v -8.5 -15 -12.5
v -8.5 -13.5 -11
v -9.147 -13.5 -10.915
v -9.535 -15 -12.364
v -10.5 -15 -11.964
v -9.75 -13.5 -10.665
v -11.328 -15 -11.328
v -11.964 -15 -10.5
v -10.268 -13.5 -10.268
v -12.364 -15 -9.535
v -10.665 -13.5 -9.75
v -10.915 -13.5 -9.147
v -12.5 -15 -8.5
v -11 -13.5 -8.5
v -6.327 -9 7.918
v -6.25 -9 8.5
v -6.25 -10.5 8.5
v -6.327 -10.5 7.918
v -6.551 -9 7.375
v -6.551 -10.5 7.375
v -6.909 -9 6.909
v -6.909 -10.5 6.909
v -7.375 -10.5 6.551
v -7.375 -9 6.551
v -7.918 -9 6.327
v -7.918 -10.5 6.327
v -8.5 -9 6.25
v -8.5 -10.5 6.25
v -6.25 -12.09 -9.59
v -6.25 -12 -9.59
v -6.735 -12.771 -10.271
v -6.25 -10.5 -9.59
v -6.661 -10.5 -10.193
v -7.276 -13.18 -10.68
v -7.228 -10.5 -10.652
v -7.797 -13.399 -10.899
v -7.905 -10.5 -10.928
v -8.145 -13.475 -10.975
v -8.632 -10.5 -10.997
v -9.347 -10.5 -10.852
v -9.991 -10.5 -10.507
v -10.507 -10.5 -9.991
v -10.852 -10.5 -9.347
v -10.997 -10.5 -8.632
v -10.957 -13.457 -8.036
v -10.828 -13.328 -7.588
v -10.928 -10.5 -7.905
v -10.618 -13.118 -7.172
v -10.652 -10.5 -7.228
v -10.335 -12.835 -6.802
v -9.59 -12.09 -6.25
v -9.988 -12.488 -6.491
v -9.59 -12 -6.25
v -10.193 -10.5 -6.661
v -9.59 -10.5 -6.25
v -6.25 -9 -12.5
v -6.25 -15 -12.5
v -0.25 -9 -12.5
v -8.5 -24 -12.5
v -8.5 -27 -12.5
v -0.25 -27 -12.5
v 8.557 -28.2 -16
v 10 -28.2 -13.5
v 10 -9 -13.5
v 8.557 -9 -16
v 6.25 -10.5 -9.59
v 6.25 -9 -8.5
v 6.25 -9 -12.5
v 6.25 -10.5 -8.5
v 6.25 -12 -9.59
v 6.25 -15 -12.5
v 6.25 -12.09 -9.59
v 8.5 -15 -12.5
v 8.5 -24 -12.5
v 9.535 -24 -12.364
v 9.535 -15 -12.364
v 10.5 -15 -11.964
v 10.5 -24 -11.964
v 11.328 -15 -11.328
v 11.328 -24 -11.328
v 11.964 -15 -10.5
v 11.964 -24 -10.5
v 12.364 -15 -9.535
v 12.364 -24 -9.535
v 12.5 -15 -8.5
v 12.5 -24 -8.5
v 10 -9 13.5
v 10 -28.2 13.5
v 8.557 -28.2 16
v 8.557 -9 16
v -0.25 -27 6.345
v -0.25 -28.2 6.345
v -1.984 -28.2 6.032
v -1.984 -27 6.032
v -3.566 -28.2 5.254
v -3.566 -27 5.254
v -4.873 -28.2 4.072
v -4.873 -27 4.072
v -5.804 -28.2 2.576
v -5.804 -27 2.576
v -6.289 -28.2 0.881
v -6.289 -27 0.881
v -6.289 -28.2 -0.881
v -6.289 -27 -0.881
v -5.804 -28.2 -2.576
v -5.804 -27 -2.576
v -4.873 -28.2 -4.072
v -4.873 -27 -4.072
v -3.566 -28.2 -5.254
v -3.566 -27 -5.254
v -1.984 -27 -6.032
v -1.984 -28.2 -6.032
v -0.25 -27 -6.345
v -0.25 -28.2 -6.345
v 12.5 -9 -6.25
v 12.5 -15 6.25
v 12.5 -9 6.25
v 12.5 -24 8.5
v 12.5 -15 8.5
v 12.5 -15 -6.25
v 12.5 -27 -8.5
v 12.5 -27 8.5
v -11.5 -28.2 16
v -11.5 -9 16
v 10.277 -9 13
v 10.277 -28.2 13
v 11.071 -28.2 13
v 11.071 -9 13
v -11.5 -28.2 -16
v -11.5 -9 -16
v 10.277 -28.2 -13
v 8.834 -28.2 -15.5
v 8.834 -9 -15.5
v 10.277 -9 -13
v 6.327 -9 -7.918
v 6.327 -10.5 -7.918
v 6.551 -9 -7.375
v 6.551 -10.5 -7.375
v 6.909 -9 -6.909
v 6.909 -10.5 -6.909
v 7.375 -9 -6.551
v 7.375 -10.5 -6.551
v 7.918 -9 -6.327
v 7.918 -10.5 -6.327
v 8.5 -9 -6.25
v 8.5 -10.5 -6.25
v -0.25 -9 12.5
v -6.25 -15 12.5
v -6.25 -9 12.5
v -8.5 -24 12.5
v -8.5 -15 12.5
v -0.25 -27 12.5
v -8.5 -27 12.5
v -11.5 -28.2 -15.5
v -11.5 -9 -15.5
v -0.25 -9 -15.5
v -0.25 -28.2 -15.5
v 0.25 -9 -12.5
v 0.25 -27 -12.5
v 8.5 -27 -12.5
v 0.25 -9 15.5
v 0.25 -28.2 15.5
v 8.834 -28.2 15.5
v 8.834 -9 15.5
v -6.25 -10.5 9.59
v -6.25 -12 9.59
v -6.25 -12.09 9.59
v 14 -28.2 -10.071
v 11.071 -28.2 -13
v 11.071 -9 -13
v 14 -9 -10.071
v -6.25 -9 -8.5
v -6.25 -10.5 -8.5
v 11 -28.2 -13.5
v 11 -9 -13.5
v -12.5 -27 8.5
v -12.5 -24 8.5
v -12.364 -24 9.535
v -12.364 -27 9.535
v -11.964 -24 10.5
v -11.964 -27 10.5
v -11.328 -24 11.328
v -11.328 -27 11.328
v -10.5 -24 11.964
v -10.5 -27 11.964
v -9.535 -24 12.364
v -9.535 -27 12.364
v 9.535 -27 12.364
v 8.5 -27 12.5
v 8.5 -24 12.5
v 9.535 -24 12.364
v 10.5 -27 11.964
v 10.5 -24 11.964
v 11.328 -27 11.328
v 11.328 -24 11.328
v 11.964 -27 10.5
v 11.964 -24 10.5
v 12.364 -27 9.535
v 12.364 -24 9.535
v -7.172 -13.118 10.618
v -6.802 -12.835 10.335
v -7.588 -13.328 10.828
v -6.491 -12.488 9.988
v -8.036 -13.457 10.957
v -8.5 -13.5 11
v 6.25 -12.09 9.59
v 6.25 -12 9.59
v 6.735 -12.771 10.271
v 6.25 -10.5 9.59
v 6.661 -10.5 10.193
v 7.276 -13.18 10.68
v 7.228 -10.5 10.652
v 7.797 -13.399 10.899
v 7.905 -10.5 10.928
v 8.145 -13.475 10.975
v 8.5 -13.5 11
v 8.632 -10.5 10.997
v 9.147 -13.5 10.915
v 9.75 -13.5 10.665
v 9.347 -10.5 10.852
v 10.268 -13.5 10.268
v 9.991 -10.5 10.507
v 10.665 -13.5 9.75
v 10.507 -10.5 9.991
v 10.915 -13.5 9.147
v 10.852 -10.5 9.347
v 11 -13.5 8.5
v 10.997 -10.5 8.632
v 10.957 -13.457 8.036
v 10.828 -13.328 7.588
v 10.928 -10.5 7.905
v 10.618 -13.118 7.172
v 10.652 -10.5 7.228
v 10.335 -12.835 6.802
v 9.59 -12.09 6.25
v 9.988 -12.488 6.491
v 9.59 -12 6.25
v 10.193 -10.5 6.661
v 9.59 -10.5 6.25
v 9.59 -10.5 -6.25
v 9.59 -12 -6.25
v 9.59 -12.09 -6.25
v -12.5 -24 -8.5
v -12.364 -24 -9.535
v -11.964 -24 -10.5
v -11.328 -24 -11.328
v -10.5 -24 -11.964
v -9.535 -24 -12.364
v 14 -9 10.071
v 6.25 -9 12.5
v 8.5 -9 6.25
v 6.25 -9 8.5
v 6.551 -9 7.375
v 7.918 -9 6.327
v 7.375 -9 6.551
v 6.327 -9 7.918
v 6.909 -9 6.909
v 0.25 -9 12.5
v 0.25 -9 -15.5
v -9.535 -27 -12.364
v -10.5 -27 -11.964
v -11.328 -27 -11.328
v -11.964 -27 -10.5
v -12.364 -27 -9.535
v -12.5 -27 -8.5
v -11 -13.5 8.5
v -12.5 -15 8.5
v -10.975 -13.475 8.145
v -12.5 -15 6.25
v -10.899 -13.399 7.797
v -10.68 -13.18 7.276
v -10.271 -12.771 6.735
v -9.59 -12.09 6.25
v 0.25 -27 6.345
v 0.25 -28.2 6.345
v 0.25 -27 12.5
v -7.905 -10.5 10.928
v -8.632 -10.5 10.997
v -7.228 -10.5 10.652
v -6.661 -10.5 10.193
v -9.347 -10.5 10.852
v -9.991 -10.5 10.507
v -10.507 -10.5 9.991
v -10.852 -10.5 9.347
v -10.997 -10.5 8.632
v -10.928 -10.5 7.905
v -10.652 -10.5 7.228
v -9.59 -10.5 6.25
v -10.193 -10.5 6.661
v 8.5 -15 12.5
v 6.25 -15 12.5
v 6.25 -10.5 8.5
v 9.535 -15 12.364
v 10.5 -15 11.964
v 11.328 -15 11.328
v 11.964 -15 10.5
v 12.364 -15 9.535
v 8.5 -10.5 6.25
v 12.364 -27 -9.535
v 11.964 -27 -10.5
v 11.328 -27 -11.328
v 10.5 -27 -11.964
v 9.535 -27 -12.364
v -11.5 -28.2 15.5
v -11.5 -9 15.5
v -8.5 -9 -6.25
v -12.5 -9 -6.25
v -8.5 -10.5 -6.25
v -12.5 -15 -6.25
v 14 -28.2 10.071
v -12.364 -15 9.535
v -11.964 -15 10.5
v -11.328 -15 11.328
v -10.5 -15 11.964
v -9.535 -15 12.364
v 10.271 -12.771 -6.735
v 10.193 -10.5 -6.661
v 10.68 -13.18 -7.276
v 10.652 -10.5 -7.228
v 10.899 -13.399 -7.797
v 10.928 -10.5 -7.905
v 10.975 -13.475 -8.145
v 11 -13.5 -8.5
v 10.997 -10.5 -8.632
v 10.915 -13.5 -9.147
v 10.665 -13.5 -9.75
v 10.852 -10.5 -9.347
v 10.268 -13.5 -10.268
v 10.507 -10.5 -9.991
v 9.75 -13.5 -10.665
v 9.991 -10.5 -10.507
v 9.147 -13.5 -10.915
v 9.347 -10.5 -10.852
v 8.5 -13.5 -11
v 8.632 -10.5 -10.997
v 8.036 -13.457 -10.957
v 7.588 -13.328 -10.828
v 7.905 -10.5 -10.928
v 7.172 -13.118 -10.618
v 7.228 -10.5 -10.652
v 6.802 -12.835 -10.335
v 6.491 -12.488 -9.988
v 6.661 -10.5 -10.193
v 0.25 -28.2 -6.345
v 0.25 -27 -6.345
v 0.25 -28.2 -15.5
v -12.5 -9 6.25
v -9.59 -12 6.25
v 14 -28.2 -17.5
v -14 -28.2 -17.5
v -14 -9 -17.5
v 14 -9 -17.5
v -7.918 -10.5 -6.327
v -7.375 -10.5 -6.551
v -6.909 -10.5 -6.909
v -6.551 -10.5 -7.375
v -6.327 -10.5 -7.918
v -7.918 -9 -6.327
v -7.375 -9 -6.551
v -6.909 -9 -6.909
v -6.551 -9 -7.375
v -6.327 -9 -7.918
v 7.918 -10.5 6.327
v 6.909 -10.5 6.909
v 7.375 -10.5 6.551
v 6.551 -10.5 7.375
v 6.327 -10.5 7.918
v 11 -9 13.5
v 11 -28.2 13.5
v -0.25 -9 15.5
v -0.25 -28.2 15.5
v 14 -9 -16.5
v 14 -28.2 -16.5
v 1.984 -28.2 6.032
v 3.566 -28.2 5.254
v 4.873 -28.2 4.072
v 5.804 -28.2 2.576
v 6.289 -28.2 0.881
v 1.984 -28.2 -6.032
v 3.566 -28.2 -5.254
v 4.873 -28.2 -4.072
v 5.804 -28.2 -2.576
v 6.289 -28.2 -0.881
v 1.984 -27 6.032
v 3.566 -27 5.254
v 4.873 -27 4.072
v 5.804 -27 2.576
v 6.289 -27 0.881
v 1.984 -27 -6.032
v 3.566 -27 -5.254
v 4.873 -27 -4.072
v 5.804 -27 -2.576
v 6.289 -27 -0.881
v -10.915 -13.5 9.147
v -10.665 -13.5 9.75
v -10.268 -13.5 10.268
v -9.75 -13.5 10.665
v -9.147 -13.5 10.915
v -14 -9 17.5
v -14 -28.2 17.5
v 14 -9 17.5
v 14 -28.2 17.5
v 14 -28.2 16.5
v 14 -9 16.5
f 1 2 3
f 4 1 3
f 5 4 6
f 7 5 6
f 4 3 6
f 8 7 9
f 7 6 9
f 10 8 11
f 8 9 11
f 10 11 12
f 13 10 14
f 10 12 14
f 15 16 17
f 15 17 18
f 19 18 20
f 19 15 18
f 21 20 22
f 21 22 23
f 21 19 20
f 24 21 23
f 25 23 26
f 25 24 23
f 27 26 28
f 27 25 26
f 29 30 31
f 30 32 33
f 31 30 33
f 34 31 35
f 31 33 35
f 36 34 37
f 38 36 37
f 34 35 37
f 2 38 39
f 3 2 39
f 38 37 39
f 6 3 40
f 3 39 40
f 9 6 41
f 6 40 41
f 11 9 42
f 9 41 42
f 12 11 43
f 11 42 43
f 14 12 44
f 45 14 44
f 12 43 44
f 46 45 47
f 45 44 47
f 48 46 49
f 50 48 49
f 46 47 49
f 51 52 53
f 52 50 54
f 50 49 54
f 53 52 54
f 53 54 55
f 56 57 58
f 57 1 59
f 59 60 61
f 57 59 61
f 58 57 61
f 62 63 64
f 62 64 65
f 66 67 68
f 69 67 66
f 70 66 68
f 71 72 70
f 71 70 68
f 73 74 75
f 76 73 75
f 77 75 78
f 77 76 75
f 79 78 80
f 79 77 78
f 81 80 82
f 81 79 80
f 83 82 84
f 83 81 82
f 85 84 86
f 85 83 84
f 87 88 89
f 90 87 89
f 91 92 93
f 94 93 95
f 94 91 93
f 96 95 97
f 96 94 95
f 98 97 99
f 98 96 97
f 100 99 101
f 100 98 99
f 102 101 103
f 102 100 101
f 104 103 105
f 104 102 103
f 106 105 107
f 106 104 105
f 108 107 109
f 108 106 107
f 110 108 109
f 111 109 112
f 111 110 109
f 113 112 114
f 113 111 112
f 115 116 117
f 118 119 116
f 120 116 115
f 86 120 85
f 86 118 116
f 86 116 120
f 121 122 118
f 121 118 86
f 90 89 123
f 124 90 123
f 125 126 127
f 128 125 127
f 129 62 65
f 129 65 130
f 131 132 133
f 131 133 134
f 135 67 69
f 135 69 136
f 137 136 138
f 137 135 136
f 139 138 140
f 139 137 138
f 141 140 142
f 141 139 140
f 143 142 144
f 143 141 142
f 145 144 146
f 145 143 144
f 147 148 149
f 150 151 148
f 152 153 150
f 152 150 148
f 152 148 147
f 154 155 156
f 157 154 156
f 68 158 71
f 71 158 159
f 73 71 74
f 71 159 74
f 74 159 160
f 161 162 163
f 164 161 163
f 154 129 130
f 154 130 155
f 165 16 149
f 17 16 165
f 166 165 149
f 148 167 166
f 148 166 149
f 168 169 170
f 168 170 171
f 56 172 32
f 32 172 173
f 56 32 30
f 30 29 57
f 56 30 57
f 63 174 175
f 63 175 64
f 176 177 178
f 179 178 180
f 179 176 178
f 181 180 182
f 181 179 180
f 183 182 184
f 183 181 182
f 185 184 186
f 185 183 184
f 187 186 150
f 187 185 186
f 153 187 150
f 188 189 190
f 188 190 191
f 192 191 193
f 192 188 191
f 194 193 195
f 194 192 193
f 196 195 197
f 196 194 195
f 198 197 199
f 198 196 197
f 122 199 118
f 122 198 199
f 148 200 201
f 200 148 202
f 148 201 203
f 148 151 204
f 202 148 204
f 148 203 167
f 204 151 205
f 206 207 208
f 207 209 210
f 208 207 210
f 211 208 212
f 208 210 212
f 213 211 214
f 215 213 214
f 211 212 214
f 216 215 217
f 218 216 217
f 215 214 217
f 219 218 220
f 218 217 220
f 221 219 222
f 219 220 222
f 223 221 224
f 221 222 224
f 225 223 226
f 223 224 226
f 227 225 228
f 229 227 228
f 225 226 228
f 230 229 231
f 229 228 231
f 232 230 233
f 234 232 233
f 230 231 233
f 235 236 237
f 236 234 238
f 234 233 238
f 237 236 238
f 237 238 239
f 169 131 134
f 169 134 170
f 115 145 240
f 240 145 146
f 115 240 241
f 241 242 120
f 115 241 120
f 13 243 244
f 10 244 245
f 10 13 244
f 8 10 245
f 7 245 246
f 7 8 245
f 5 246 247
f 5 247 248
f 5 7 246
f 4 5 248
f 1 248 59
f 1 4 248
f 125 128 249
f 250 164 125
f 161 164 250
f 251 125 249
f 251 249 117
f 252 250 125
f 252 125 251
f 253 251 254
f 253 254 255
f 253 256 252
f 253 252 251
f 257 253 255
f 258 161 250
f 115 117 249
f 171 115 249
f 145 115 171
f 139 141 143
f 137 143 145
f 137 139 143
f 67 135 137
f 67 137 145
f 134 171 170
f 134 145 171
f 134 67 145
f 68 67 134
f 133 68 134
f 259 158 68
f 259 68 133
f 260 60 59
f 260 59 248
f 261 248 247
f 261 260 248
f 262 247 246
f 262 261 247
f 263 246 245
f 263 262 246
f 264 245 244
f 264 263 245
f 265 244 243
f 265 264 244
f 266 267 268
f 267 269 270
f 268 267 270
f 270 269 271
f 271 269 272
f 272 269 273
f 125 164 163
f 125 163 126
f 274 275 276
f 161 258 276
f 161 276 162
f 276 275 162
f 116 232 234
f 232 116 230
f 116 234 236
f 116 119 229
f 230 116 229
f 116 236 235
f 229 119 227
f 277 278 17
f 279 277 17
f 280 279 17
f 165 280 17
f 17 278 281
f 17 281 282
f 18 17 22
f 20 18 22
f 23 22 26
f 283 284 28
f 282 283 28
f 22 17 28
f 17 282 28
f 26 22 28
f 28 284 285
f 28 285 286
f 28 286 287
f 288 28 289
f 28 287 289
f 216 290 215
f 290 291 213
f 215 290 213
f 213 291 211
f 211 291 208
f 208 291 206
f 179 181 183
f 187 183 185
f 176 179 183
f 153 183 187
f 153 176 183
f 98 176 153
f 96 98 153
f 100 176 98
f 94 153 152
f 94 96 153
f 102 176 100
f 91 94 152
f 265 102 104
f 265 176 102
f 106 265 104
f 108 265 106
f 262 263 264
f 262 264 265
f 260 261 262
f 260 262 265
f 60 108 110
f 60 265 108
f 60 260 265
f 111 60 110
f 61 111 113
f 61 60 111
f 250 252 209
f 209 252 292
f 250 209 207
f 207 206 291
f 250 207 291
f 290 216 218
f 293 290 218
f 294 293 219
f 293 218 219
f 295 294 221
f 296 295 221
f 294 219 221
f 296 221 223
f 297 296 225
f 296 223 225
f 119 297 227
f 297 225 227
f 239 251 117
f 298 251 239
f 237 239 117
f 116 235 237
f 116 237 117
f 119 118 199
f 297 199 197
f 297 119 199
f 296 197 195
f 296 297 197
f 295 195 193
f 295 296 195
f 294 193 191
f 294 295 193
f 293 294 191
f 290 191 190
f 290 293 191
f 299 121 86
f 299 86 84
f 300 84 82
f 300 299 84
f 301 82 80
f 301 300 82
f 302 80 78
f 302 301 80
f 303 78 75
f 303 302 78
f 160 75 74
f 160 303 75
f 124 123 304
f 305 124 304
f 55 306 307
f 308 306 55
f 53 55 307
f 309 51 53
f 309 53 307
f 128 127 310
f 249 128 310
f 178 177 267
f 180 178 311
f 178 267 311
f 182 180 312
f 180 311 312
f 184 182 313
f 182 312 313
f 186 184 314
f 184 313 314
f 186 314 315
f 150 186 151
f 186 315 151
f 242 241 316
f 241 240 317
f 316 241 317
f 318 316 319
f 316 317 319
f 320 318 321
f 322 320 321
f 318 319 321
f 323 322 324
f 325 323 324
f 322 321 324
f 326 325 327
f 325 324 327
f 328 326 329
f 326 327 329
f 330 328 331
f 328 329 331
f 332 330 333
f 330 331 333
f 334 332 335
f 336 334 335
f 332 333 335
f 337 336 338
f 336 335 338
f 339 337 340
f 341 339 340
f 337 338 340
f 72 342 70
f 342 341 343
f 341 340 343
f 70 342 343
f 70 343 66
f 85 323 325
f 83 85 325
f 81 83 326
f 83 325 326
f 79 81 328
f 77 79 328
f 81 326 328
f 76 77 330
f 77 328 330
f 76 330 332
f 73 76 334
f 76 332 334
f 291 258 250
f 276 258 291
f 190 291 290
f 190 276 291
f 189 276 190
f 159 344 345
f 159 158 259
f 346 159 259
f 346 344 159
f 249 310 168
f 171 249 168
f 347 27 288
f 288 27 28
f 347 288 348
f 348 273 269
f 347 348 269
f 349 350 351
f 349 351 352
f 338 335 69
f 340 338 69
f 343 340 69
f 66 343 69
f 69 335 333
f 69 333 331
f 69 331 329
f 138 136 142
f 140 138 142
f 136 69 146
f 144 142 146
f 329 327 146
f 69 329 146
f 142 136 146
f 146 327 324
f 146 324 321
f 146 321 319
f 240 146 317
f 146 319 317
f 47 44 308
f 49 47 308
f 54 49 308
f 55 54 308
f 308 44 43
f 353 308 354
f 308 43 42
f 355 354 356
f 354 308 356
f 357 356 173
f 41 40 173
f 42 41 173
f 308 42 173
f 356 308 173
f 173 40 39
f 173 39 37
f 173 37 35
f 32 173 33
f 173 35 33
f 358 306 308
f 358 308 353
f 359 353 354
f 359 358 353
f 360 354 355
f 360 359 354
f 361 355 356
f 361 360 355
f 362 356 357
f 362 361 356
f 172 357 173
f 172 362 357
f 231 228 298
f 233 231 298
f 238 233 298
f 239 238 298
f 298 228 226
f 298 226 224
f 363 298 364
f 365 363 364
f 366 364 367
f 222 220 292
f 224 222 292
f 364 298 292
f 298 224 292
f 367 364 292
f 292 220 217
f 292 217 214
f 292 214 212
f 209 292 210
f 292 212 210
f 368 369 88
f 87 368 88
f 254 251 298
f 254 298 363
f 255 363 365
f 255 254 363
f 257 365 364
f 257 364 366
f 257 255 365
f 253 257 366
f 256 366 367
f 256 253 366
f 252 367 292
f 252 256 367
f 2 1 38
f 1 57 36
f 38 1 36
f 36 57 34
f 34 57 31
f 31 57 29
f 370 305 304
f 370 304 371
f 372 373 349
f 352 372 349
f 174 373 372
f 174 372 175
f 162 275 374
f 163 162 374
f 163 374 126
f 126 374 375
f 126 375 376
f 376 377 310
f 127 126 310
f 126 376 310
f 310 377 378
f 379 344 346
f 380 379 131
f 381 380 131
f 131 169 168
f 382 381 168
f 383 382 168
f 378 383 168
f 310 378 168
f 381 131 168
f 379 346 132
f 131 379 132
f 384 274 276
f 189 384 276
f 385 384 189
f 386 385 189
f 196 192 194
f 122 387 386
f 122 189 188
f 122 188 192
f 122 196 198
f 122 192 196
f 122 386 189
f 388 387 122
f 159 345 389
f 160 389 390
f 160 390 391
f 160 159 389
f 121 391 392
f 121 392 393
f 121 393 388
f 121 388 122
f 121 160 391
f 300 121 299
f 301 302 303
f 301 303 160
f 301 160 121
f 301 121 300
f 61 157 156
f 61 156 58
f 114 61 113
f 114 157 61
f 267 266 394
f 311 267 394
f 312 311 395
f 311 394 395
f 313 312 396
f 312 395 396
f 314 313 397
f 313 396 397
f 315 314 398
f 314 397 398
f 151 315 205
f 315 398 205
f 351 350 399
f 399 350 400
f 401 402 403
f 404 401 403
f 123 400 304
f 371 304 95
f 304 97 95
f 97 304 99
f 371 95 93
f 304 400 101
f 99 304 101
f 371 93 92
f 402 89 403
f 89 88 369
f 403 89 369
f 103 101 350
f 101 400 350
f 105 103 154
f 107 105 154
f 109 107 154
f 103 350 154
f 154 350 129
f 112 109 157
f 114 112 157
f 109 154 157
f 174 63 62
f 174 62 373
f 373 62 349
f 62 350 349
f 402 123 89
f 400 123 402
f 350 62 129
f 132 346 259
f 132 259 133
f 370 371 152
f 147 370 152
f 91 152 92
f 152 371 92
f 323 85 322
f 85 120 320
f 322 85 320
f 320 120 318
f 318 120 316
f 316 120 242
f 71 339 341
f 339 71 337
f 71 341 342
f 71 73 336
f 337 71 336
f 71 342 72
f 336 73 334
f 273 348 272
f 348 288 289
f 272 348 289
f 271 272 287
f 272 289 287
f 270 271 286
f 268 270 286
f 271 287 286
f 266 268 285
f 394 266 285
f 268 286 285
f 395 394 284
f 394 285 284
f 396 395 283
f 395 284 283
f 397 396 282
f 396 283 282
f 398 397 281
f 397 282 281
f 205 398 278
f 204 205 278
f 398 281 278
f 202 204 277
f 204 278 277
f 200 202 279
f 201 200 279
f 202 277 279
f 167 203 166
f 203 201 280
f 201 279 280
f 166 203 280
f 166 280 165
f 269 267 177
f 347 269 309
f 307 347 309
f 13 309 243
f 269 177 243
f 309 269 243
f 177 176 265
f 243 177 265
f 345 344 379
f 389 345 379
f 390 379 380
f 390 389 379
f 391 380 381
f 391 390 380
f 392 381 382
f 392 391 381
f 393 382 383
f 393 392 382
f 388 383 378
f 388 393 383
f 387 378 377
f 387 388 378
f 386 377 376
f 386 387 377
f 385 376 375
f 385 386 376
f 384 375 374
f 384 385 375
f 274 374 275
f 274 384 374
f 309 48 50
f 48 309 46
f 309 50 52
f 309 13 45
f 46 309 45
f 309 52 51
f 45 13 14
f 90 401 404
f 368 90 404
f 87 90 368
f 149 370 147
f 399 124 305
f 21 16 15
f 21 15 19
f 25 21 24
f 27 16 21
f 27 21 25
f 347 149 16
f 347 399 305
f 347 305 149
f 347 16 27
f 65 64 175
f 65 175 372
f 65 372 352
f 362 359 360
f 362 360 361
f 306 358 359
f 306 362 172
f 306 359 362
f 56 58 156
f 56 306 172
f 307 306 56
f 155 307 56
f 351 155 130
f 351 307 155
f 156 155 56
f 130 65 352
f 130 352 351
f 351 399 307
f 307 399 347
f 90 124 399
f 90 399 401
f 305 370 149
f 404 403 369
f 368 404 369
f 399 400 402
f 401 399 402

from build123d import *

# Parameters (mm, degrees)
SKETCH1_W           = 8.4
SKETCH1_H           = 3
SKETCH2_OUTSIDE_W   = 44.372
SKETCH2_OUTSIDE_H   = 44.372
SKETCH2_OUTSIDE_W_2 = 28
SKETCH2_OUTSIDE_H_2 = 35
CUT_EXTRUDE2_DEPTH  = 24.70949177
SKETCH2_3_W         = 28
SKETCH2_3_H         = 35
SKETCH2_3_W_2       = 25
SKETCH2_3_H_2       = 25
BOSS_EXTRUDE1_DEPTH = 15
BOSS_EXTRUDE2_START = -4.2
BOSS_EXTRUDE2_DEPTH = 4.2
FILLET1_R           = 4
BOSS_EXTRUDE4_DEPTH = 3
SKETCH3_5_R         = 2.25
SKETCH3_5_R_2       = 1.45
BOSS_EXTRUDE6_DEPTH = 1.5
SKETCH3_R           = 1.45
BOSS_EXTRUDE3_DEPTH = 1.5
CIRPATTERN7_COUNT   = 4
CHAMFER1_SIZE       = 3
CUT_EXTRUDE6_START  = -3
CUT_EXTRUDE6_DEPTH  = 3
CUT_EXTRUDE5_START  = -19.2
CUT_EXTRUDE5_DEPTH  = 19.2


# Read off the part's stored shape, not the designer's step: Cut-Extrude5
with BuildPart() as part:
    # Sketch1 → Revolve2 (revolve)
    with BuildSketch(Plane.XY, mode=Mode.PRIVATE) as revolve2_sk:
        with Locations((-12.3, -25.5)):
            Rectangle(SKETCH1_W, SKETCH1_H)
        Polygon((-6.35, -27), (-8.1, -27), (-16.5, -27), (-16.5, -28.2), (-8.1, -28.2), (-6.35, -28.2), align=None)
    revolve(revolve2_sk.sketch.rotate(Axis((0, 21.737527327, 0), (0, -1, 0)), 270), axis=Axis((0, 21.737527327, 0), (0, -1, 0)))

    # Sketch2 outside → Cut-Extrude2 (cut, through all)
    with BuildSketch(Plane(origin=(0, -24, 0), x_dir=(1, 0, 0), z_dir=(0, 1, 0))):
        Rectangle(SKETCH2_OUTSIDE_W, SKETCH2_OUTSIDE_H)
        Rectangle(SKETCH2_OUTSIDE_W_2, SKETCH2_OUTSIDE_H_2, mode=Mode.SUBTRACT)
    extrude(amount=-CUT_EXTRUDE2_DEPTH, mode=Mode.SUBTRACT)

    # Sketch2<3> → Boss-Extrude1 (add)
    with BuildSketch(Plane(origin=(0, -24, 0), x_dir=(1, 0, 0), z_dir=(0, 1, 0))):
        Rectangle(SKETCH2_3_W, SKETCH2_3_H)
        Rectangle(SKETCH2_3_W_2, SKETCH2_3_H_2, mode=Mode.SUBTRACT)
    extrude(amount=BOSS_EXTRUDE1_DEPTH)

    # Sketch2<4> → Boss-Extrude2 (add)
    with BuildSketch(Plane(origin=(0, -24, 0), x_dir=(1, 0, 0), z_dir=(0, 1, 0)).offset(BOSS_EXTRUDE2_START)):
        with BuildLine():
            Line((-12.5, -12.5), (-10.770329614, -12.5))
            ThreePointArc((-10.770329614, -12.5), (-11.66726189, -11.66726189), (-12.5, -10.770329614))
            Line((-12.5, -10.770329614), (-12.5, -12.5))
        make_face()
        with BuildLine():
            Line((12.5, -10.770329614), (12.5, -12.5))
            Line((12.5, -12.5), (10.770329614, -12.5))
            ThreePointArc((10.770329614, -12.5), (0, -16.5), (-10.770329614, -12.5))
            Line((-10.770329614, -12.5), (-12.5, -12.5))
            Line((-12.5, -12.5), (-12.5, -10.770329614))
            ThreePointArc((-12.5, -10.770329614), (-13.289133528, -9.7800271), (-14, -8.732124598))
            Line((-14, -8.732124598), (-14, -17.5))
            Line((-14, -17.5), (14, -17.5))
            Line((14, -17.5), (14, -8.732124598))
            ThreePointArc((14, -8.732124598), (13.289133528, -9.7800271), (12.5, -10.770329614))
        make_face()
        with BuildLine():
            Line((10.770329614, -12.5), (12.5, -12.5))
            Line((12.5, -12.5), (12.5, -10.770329614))
            ThreePointArc((12.5, -10.770329614), (11.66726189, -11.66726189), (10.770329614, -12.5))
        make_face()
        with BuildLine():
            Line((12.5, 12.5), (12.5, 10.770329614))
            ThreePointArc((12.5, 10.770329614), (13.289133528, 9.7800271), (14, 8.732124598))
            Line((14, 8.732124598), (14, 17.5))
            Line((14, 17.5), (-14, 17.5))
            Line((-14, 17.5), (-14, 8.732124598))
            ThreePointArc((-14, 8.732124598), (-13.289133528, 9.7800271), (-12.5, 10.770329614))
            Line((-12.5, 10.770329614), (-12.5, 12.5))
            Line((-12.5, 12.5), (-10.770329614, 12.5))
            ThreePointArc((-10.770329614, 12.5), (0, 16.5), (10.770329614, 12.5))
            Line((10.770329614, 12.5), (12.5, 12.5))
        make_face()
        with BuildLine():
            ThreePointArc((10.770329614, 12.5), (11.66726189, 11.66726189), (12.5, 10.770329614))
            Line((12.5, 10.770329614), (12.5, 12.5))
            Line((12.5, 12.5), (10.770329614, 12.5))
        make_face()
        with BuildLine():
            Line((-12.5, 12.5), (-12.5, 10.770329614))
            ThreePointArc((-12.5, 10.770329614), (-11.66726189, 11.66726189), (-10.770329614, 12.5))
            Line((-10.770329614, 12.5), (-12.5, 12.5))
        make_face()
    extrude(amount=BOSS_EXTRUDE2_DEPTH)

    # Fillet1
    fillet1_edges = [part.edges().sort_by_distance(p)[0] for p in [
        (-12.5, -16.5, 12.5),
        (12.5, -16.5, 12.5),
        (12.5, -16.5, -12.5),
        (-12.5, -16.5, -12.5),
    ]]
    fillet(fillet1_edges, radius=FILLET1_R)

    # Sketch3<3> → Boss-Extrude4 (add)
    with BuildSketch(Plane(origin=(0, -9, 0), x_dir=(1, 0, 0), z_dir=(0, 1, 0))):
        with BuildLine():
            Line((-12.5, 12.5), (-12.5, 8.5))
            ThreePointArc((-12.5, 8.5), (-11.328427125, 11.328427125), (-8.5, 12.5))
            Line((-8.5, 12.5), (-12.5, 12.5))
        make_face()
        with BuildLine():
            Line((-12.5, 6.25), (-9.589724736, 6.25))
            ThreePointArc((-9.589724736, 6.25), (-10.267766953, 10.267766953), (-6.25, 9.589724736))
            Line((-6.25, 9.589724736), (-6.25, 12.5))
            Line((-6.25, 12.5), (-8.5, 12.5))
            ThreePointArc((-8.5, 12.5), (-11.328427125, 11.328427125), (-12.5, 8.5))
            Line((-12.5, 8.5), (-12.5, 6.25))
        make_face()
    boss_extrude4 = extrude(amount=-BOSS_EXTRUDE4_DEPTH)

    # Sketch3<5> → Boss-Extrude6 (add)
    # profile 1 of 2: a face of its own
    with BuildSketch(Plane(origin=(0, -9, 0), x_dir=(1, 0, 0), z_dir=(0, 1, 0))):
        with BuildLine():
            Line((-9.589724736, 6.25), (-8.5, 6.25))
            ThreePointArc((-8.5, 6.25), (-10.090990258, 10.090990258), (-6.25, 8.5))
            Line((-6.25, 8.5), (-6.25, 9.589724736))
            ThreePointArc((-6.25, 9.589724736), (-10.267766953, 10.267766953), (-9.589724736, 6.25))
        make_face()
    # profile 2 of 2: a face of its own
    with BuildSketch(Plane(origin=(0, -9, 0), x_dir=(1, 0, 0), z_dir=(0, 1, 0))):
        with Locations((-8.5, 8.5)):
            Circle(SKETCH3_5_R)
        with Locations(Location((-8.5, 8.5, 0), (0, 0, 270))):
            Circle(SKETCH3_5_R_2, mode=Mode.SUBTRACT)
    boss_extrude6 = extrude(amount=-BOSS_EXTRUDE6_DEPTH)

    # Sketch3 → Boss-Extrude3 (add)
    with BuildSketch(Plane(origin=(0, -9, 0), x_dir=(1, 0, 0), z_dir=(0, 1, 0))):
        with Locations((-8.5, 8.5)):
            Circle(SKETCH3_R)
    boss_extrude3 = extrude(amount=-BOSS_EXTRUDE3_DEPTH)

    # CirPattern7: Boss-Extrude4, Boss-Extrude6, Boss-Extrude3 ×4 about axis
    cirpattern7_axis = Axis((0, 0, 0), (0, 1, 0))
    add([boss_extrude4.rotate(cirpattern7_axis, i * 360 / CIRPATTERN7_COUNT) for i in range(1, CIRPATTERN7_COUNT)])
    add([boss_extrude6.rotate(cirpattern7_axis, i * 360 / CIRPATTERN7_COUNT) for i in range(1, CIRPATTERN7_COUNT)])
    add([boss_extrude3.rotate(cirpattern7_axis, i * 360 / CIRPATTERN7_COUNT) for i in range(1, CIRPATTERN7_COUNT)])

    # Chamfer1
    # the kernel refuses this chamfer: 3 mm, written as the material it adds along each edge
    with BuildSketch(Plane(origin=(-8.5, -12, -8.5), x_dir=(0, 0, -1), z_dir=(1, 0, 0))) as chamfer1_piece_1_section:
        Polygon((4, -CHAMFER1_SIZE), (4 - CHAMFER1_SIZE, 0), (4, 0), align=None)
    chamfer1_piece_1 = revolve(axis=Axis((-8.5, -12, -8.5), (0, 1, 0)), revolution_arc=90, mode=Mode.PRIVATE)
    chamfer1_piece_1 = chamfer1_piece_1 - Plane(origin=(-8.5, -13.21364555, -8.5), x_dir=(-0.4358898943541021, 0, 0.8999999999999833), z_dir=(0, 1, 0)) * Cylinder(2.5, 16, mode=Mode.PRIVATE)
    add(chamfer1_piece_1)
    with BuildSketch(Plane(origin=(-6.25, -12, -12.5), x_dir=(0, -0.9996219169112969, -0.02749587661058621), z_dir=(-1, 0, 0))) as chamfer1_piece_2_section:
        Polygon((CHAMFER1_SIZE * 0.999621916911, CHAMFER1_SIZE * 0.0274958766106), (-CHAMFER1_SIZE * 0.0274958766106, CHAMFER1_SIZE * 0.999621916911), (0, 0), align=None)
    chamfer1_piece_2 = extrude(amount=2.25, mode=Mode.PRIVATE)
    chamfer1_piece_2 = chamfer1_piece_2 - Plane(origin=(-8.5, -13.109465827, -8.5), x_dir=(-0.4358898943541021, 0, 0.8999999999999833), z_dir=(0, 1, 0)) * Cylinder(2.5, 17, mode=Mode.PRIVATE)
    add(chamfer1_piece_2)
    with BuildSketch(Plane(origin=(-12.5, -12, -8.5), x_dir=(-0.027495876610586206, -0.9996219169112968, 0), z_dir=(0, 0, 1))) as chamfer1_piece_3_section:
        Polygon((CHAMFER1_SIZE * 0.999621916911, CHAMFER1_SIZE * 0.0274958766106), (-CHAMFER1_SIZE * 0.0274958766106, CHAMFER1_SIZE * 0.999621916911), (0, 0), align=None)
    chamfer1_piece_3 = extrude(amount=2.25, mode=Mode.PRIVATE)
    chamfer1_piece_3 = chamfer1_piece_3 - Plane(origin=(-8.5, -13.109465904, -8.5), x_dir=(-0.4358898943541021, 0, 0.8999999999999833), z_dir=(0, 1, 0)) * Cylinder(2.5, 17, mode=Mode.PRIVATE)
    add(chamfer1_piece_3)
    with BuildSketch(Plane(origin=(-8.5, -12, 8.5), x_dir=(-1, 0, 0), z_dir=(0, 0, -1))) as chamfer1_piece_4_section:
        Polygon((4, -CHAMFER1_SIZE), (4 - CHAMFER1_SIZE, 0), (4, 0), align=None)
    chamfer1_piece_4 = revolve(axis=Axis((-8.5, -12, 8.5), (0, 1, 0)), revolution_arc=90, mode=Mode.PRIVATE)
    chamfer1_piece_4 = chamfer1_piece_4 - Plane(origin=(-8.5, -13.21364555, 8.5), x_dir=(0.8999999999999833, 0, 0.4358898943541022), z_dir=(0, 1, 0)) * Cylinder(2.5, 16, mode=Mode.PRIVATE)
    add(chamfer1_piece_4)
    with BuildSketch(Plane(origin=(-12.5, -12, 6.25), x_dir=(-0.027495876610578136, -0.9996219169112969, 0), z_dir=(0, 0, 1))) as chamfer1_piece_5_section:
        Polygon((CHAMFER1_SIZE * 0.999621916911, CHAMFER1_SIZE * 0.0274958766106), (-CHAMFER1_SIZE * 0.0274958766106, CHAMFER1_SIZE * 0.999621916911), (0, 0), align=None)
    chamfer1_piece_5 = extrude(amount=2.25, mode=Mode.PRIVATE)
    chamfer1_piece_5 = chamfer1_piece_5 - Plane(origin=(-8.5, -13.109465827, 8.5), x_dir=(0.8999999999999833, 0, 0.4358898943541022), z_dir=(0, 1, 0)) * Cylinder(2.5, 17, mode=Mode.PRIVATE)
    add(chamfer1_piece_5)
    with BuildSketch(Plane(origin=(-8.5, -12, 12.5), x_dir=(0, -0.9996219169112969, 0.02749587661058621), z_dir=(1, 0, 0))) as chamfer1_piece_6_section:
        Polygon((CHAMFER1_SIZE * 0.999621916911, CHAMFER1_SIZE * 0.0274958766106), (-CHAMFER1_SIZE * 0.0274958766106, CHAMFER1_SIZE * 0.999621916911), (0, 0), align=None)
    chamfer1_piece_6 = extrude(amount=2.25, mode=Mode.PRIVATE)
    chamfer1_piece_6 = chamfer1_piece_6 - Plane(origin=(-8.5, -13.109465224, 8.5), x_dir=(0.8999999999999833, 0, 0.4358898943541022), z_dir=(0, 1, 0)) * Cylinder(2.5, 17, mode=Mode.PRIVATE)
    add(chamfer1_piece_6)
    with BuildSketch(Plane(origin=(8.5, -12, 8.5), x_dir=(0, 0, 1), z_dir=(-1, 0, 0))) as chamfer1_piece_7_section:
        Polygon((4, -CHAMFER1_SIZE), (4 - CHAMFER1_SIZE, 0), (4, 0), align=None)
    chamfer1_piece_7 = revolve(axis=Axis((8.5, -12, 8.5), (0, 1, 0)), revolution_arc=90, mode=Mode.PRIVATE)
    chamfer1_piece_7 = chamfer1_piece_7 - Plane(origin=(8.5, -13.21364555, 8.5), x_dir=(0.4358898943541022, 0, -0.8999999999999833), z_dir=(0, 1, 0)) * Cylinder(2.5, 16, mode=Mode.PRIVATE)
    add(chamfer1_piece_7)
    with BuildSketch(Plane(origin=(6.25, -12, 12.5), x_dir=(0, -0.9996219169112969, 0.02749587661057756), z_dir=(1, 0, 0))) as chamfer1_piece_8_section:
        Polygon((CHAMFER1_SIZE * 0.999621916911, CHAMFER1_SIZE * 0.0274958766106), (-CHAMFER1_SIZE * 0.0274958766106, CHAMFER1_SIZE * 0.999621916911), (0, 0), align=None)
    chamfer1_piece_8 = extrude(amount=2.25, mode=Mode.PRIVATE)
    chamfer1_piece_8 = chamfer1_piece_8 - Plane(origin=(8.5, -13.109465827, 8.5), x_dir=(0.4358898943541022, 0, -0.8999999999999833), z_dir=(0, 1, 0)) * Cylinder(2.5, 17, mode=Mode.PRIVATE)
    add(chamfer1_piece_8)
    with BuildSketch(Plane(origin=(12.5, -12, 8.5), x_dir=(0.02749587661059426, -0.9996219169112965, 0), z_dir=(0, 0, -1))) as chamfer1_piece_9_section:
        Polygon((CHAMFER1_SIZE * 0.999621916911, CHAMFER1_SIZE * 0.0274958766106), (-CHAMFER1_SIZE * 0.0274958766106, CHAMFER1_SIZE * 0.999621916911), (0, 0), align=None)
    chamfer1_piece_9 = extrude(amount=2.25, mode=Mode.PRIVATE)
    chamfer1_piece_9 = chamfer1_piece_9 - Plane(origin=(8.5, -13.109465969, 8.5), x_dir=(0.4358898943541022, 0, -0.8999999999999833), z_dir=(0, 1, 0)) * Cylinder(2.5, 17, mode=Mode.PRIVATE)
    add(chamfer1_piece_9)
    with BuildSketch(Plane(origin=(8.5, -12, -8.5), x_dir=(1, 0, 0), z_dir=(0, 0, 1))) as chamfer1_piece_10_section:
        Polygon((4, -CHAMFER1_SIZE), (4 - CHAMFER1_SIZE, 0), (4, 0), align=None)
    chamfer1_piece_10 = revolve(axis=Axis((8.5, -12, -8.5), (0, 1, 0)), revolution_arc=90, mode=Mode.PRIVATE)
    chamfer1_piece_10 = chamfer1_piece_10 - Plane(origin=(8.5, -13.21364555, -8.5), x_dir=(-0.8999999999999831, 0, -0.4358898943541023), z_dir=(0, 1, 0)) * Cylinder(2.5, 16, mode=Mode.PRIVATE)
    add(chamfer1_piece_10)
    with BuildSketch(Plane(origin=(12.5, -12, -6.25), x_dir=(0.02749587661058506, -0.9996219169112969, 0), z_dir=(0, 0, -1))) as chamfer1_piece_11_section:
        Polygon((CHAMFER1_SIZE * 0.999621916911, CHAMFER1_SIZE * 0.0274958766106), (-CHAMFER1_SIZE * 0.0274958766106, CHAMFER1_SIZE * 0.999621916911), (0, 0), align=None)
    chamfer1_piece_11 = extrude(amount=2.25, mode=Mode.PRIVATE)
    chamfer1_piece_11 = chamfer1_piece_11 - Plane(origin=(8.5, -13.109465859, -8.5), x_dir=(-0.8999999999999831, 0, -0.4358898943541023), z_dir=(0, 1, 0)) * Cylinder(2.5, 17, mode=Mode.PRIVATE)
    add(chamfer1_piece_11)
    with BuildSketch(Plane(origin=(8.5, -12, -12.5), x_dir=(0, -0.9996219169112965, -0.027495876610595413), z_dir=(-1, 0, 0))) as chamfer1_piece_12_section:
        Polygon((CHAMFER1_SIZE * 0.999621916911, CHAMFER1_SIZE * 0.0274958766106), (-CHAMFER1_SIZE * 0.0274958766106, CHAMFER1_SIZE * 0.999621916911), (0, 0), align=None)
    chamfer1_piece_12 = extrude(amount=2.25, mode=Mode.PRIVATE)
    chamfer1_piece_12 = chamfer1_piece_12 - Plane(origin=(8.5, -13.109465904, -8.5), x_dir=(-0.8999999999999831, 0, -0.4358898943541023), z_dir=(0, 1, 0)) * Cylinder(2.5, 17, mode=Mode.PRIVATE)
    add(chamfer1_piece_12)

    # Sketch5 → Cut-Extrude6 (cut)
    with BuildSketch(Plane(origin=(0, -24, 0), x_dir=(1, 0, 0), z_dir=(0, 1, 0)).offset(CUT_EXTRUDE6_START)):
        with BuildLine():
            Line((8.5, 12.5), (-8.5, 12.5))
            ThreePointArc((-8.5, 12.5), (-11.328427125, 11.328427125), (-12.5, 8.5))
            Line((-12.5, 8.5), (-12.5, -8.5))
            ThreePointArc((-12.5, -8.5), (-11.328427125, -11.328427125), (-8.5, -12.5))
            Line((-8.5, -12.5), (8.5, -12.5))
            ThreePointArc((8.5, -12.5), (11.328427125, -11.328427125), (12.5, -8.5))
            Line((12.5, -8.5), (12.5, 8.5))
            ThreePointArc((12.5, 8.5), (11.328427125, 11.328427125), (8.5, 12.5))
        make_face()
    extrude(amount=CUT_EXTRUDE6_DEPTH, mode=Mode.SUBTRACT)

    # Cut-Extrude5 outline → Cut-Extrude5 (cut)
    with BuildSketch(Plane(origin=(0, -9, 0), x_dir=(1, 0, 0), z_dir=(0, 1, 0)).offset(CUT_EXTRUDE5_START)):
        with BuildLine():
            Line((10.277128129, 13), (11.071067812, 13))
            Line((11.071067812, 13), (14, 10.071067812))
            Line((14, 10.071067812), (14, 16.5))
            Line((14, 16.5), (11, 13.5))
            Line((11, 13.5), (10, 13.5))
            Line((10, 13.5), (8.556624327, 16))
            Line((8.556624327, 16), (-11.5, 16))
            Line((-11.5, 16), (-11.5, 15.5))
            Line((-11.5, 15.5), (-0.25, 15.5))
            Line((-0.25, 15.5), (-0.25, 6.345076832))
            ThreePointArc((-0.25, 6.345076832), (0, 6.35), (0.25, 6.345076832))
            Line((0.25, 6.345076832), (0.25, 15.5))
            Line((0.25, 15.5), (8.833752456, 15.5))
            Line((8.833752456, 15.5), (10.277128129, 13))
        make_face()
    cut_extrude5 = extrude(amount=CUT_EXTRUDE5_DEPTH, mode=Mode.SUBTRACT)

    # Mirror1: Cut-Extrude5 across plane
    add(cut_extrude5.mirror(Plane.XY), mode=Mode.SUBTRACT)


solid = part.part
